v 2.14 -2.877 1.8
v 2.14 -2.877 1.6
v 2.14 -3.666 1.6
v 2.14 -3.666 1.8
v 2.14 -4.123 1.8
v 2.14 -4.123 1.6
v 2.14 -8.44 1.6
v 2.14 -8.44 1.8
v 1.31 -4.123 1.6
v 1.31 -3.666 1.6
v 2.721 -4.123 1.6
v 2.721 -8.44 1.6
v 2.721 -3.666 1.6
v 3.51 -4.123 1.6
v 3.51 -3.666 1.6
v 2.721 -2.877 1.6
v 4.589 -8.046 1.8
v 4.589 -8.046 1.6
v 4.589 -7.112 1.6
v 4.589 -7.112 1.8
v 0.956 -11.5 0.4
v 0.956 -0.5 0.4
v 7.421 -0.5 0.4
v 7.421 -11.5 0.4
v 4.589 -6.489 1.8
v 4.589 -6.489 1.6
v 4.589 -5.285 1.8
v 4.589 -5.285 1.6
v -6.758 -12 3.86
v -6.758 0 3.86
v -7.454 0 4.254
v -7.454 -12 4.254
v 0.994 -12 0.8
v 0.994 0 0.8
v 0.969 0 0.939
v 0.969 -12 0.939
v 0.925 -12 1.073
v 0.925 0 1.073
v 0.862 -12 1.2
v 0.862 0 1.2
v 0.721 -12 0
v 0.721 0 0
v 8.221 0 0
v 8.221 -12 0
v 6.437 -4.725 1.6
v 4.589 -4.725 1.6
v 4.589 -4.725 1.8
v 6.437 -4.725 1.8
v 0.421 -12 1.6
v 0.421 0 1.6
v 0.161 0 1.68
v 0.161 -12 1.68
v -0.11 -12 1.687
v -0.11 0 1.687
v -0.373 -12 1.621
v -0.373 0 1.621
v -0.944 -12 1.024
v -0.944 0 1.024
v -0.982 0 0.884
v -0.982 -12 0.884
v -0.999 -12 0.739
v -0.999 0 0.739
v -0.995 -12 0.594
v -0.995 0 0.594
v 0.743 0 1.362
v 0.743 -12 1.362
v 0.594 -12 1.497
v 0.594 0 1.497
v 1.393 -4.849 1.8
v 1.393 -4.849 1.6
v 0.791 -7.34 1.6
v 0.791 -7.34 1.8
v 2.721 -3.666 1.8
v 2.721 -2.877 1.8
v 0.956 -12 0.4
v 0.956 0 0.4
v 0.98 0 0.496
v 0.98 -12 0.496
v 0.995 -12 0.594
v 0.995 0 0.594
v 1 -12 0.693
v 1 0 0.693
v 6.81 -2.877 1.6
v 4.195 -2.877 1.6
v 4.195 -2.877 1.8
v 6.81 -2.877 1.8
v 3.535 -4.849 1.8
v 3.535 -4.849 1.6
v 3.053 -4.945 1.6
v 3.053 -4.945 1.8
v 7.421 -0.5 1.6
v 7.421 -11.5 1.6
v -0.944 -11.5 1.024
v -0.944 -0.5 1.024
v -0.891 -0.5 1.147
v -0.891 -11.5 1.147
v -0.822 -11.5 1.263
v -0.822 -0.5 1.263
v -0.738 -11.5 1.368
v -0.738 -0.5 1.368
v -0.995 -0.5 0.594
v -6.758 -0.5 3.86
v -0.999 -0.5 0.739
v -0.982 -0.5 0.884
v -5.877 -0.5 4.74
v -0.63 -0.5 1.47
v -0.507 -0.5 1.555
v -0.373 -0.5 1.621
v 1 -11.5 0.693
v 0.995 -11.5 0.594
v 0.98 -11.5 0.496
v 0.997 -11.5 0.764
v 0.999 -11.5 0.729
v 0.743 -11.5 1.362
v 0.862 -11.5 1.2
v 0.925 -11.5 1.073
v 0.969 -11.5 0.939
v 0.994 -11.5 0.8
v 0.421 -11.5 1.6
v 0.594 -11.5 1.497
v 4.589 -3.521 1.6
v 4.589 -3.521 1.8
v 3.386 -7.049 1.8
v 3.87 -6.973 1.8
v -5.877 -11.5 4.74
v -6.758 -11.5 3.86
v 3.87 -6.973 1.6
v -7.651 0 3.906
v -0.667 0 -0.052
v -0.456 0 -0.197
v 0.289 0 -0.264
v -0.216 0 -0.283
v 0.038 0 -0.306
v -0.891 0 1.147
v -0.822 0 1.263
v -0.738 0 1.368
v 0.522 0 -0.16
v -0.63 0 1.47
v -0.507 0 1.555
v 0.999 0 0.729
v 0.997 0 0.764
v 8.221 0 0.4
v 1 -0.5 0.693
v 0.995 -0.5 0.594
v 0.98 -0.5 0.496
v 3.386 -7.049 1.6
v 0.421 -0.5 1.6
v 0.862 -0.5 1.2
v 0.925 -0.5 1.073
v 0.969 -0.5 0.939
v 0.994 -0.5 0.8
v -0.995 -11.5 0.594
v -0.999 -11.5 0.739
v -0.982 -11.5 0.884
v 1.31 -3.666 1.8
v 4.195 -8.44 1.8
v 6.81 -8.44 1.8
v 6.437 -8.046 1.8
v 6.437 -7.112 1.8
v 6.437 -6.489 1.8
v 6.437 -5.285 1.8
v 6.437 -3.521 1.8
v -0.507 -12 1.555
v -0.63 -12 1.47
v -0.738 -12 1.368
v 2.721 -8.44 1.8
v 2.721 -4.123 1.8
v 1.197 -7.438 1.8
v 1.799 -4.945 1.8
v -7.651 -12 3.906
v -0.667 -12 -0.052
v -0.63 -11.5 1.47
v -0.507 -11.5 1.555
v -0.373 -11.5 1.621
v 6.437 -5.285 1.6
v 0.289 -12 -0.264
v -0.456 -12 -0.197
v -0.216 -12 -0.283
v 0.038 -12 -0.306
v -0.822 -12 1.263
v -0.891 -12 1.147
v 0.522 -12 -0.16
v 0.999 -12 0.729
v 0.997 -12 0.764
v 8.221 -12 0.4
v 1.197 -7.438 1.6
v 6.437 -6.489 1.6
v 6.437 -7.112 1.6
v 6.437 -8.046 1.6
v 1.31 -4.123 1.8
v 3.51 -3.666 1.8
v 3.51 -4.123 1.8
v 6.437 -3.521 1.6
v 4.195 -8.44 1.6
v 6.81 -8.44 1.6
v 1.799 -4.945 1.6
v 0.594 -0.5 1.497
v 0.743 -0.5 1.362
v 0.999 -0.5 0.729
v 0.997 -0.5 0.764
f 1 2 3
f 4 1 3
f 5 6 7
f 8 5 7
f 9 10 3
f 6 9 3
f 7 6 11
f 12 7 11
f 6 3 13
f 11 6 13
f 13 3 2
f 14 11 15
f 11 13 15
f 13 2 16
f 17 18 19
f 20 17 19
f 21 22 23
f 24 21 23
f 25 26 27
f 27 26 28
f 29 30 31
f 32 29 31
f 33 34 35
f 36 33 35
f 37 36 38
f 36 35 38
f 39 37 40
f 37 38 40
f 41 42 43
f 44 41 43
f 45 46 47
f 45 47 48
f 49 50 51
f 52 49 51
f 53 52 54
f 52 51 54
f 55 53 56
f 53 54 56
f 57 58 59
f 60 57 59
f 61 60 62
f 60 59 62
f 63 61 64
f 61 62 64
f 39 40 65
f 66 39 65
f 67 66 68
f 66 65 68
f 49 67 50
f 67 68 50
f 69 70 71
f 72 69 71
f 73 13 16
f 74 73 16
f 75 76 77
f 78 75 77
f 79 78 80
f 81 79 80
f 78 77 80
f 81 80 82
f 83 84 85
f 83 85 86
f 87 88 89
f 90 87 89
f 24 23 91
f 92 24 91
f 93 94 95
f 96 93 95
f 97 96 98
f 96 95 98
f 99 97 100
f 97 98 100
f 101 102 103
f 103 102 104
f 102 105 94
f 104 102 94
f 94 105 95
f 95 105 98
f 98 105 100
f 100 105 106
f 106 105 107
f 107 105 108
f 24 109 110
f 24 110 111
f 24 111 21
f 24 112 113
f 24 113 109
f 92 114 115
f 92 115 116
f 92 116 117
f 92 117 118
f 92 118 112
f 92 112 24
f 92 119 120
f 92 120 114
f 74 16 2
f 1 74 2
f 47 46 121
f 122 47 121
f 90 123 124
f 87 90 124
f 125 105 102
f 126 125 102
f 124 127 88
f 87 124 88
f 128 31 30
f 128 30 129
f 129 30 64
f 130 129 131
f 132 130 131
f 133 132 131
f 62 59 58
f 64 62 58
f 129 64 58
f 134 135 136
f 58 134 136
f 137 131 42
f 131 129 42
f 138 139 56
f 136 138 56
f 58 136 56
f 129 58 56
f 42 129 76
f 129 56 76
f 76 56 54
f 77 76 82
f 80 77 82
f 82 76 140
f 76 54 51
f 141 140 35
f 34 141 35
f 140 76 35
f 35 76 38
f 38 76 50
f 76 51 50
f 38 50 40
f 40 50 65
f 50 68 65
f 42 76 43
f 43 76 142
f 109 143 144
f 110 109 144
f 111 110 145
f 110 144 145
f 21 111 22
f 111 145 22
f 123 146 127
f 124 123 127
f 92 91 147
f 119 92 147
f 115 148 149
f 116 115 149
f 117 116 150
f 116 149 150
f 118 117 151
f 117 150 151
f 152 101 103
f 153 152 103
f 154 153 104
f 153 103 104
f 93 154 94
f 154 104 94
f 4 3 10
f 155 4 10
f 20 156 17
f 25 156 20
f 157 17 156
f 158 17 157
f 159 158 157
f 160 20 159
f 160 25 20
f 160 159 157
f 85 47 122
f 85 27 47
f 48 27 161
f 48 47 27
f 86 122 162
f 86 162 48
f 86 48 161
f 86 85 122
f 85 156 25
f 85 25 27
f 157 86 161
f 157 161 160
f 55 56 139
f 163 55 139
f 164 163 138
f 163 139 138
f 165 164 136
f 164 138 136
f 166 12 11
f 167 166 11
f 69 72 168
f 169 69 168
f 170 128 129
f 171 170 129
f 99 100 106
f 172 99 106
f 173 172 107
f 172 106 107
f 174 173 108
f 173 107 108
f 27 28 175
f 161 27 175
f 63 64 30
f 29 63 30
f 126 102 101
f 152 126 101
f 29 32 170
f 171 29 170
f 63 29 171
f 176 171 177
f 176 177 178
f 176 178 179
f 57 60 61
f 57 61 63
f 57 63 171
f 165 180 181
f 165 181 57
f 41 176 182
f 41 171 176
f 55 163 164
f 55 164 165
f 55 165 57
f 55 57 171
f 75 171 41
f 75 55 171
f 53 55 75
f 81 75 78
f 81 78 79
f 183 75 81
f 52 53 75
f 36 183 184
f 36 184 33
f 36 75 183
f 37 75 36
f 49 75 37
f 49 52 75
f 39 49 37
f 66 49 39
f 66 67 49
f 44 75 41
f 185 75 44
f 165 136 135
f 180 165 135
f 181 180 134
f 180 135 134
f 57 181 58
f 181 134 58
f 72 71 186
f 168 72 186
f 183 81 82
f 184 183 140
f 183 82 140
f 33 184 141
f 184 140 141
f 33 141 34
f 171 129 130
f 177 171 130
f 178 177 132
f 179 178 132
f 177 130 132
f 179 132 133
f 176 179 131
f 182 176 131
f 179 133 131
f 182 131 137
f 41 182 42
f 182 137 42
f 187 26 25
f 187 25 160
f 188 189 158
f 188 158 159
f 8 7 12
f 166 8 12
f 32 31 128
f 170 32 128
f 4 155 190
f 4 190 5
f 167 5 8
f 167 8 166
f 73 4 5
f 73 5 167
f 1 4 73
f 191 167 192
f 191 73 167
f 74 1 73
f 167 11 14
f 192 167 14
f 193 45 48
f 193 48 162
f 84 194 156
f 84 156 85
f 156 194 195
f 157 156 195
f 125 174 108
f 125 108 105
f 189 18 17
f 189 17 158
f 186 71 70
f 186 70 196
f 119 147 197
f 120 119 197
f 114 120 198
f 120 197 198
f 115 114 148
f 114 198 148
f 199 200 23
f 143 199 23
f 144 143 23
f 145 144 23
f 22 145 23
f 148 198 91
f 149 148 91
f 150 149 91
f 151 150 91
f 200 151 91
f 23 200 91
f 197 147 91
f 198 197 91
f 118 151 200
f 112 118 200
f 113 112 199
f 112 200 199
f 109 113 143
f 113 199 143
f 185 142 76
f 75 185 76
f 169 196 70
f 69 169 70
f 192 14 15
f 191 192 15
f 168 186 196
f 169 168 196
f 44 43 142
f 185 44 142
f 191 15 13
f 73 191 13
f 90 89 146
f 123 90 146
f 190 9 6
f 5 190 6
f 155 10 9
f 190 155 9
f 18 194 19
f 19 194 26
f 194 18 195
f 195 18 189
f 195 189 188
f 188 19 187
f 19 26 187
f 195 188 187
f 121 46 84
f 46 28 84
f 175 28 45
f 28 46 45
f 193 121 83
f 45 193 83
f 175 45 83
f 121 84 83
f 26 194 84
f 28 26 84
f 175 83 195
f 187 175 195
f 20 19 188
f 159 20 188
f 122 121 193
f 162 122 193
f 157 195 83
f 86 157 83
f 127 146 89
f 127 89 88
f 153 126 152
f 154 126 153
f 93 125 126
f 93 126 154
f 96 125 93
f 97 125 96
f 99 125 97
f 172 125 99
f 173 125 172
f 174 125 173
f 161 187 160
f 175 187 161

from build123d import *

# Parameters (mm, degrees)
F1_DEPTH = 12
F2_DEPTH = 11.5
F3_DEPTH = 0.5
F6_DEPTH = 0.2
F5_W     = 2.6153679937
F5_H     = 5.5628458504
F5_W_2   = 1.8473630771
F5_H_2   = 0.9340597317
F5_H_3   = 1.2038992718
F5_H_4   = 1.2038995046


with BuildPart() as f1:
    # F0 (on Front) → F1 (new body)
    with BuildSketch(Plane.XZ):
        with BuildLine():
            ThreePointArc((-0.6667518235, -0.0523417812), (0.0376902395, -0.3063514346), (0.7209971417, 0))
            ThreePointArc((0.7209971417, 0), (0.8620847172, 0.1861738498), (0.9561314277, 0.4))
            ThreePointArc((0.9561314277, 0.4), (0.9889720491, 0.5448357533), (1, 0.6929380359))
            ThreePointArc((1, 0.6929380359), (0.9985620537, 0.7465461035), (0.9942523502, 0.8))
            ThreePointArc((0.9942523502, 0.8), (0.9493862752, 1.0070490043), (0.8619096035, 1.2))
            ThreePointArc((0.8619096035, 1.2), (0.6719095395, 1.4335712588), (0.4209971417, 1.6))
            ThreePointArc((0.4209971417, 1.6), (0.0258903466, 1.6926028247), (-0.3734801914, 1.6205761909))
            ThreePointArc((-0.3734801914, 1.6205761909), (-0.5700605115, 1.514540746), (-0.7382020302, 1.3675177292))
            ThreePointArc((-0.7382020302, 1.3675177292), (-0.858231763, 1.206200387), (-0.9435628237, 1.0241316314))
            ThreePointArc((-0.9435628237, 1.0241316314), (-0.9929283296, 0.8116533775), (-0.995046372, 0.5935261773))
            ThreePointArc((-0.995046372, 0.5935261773), (-0.8914480723, 0.2398151669), (-0.6667518235, -0.0523417812))
        make_face()
        with BuildLine():
            ThreePointArc((0.9561314277, 0.4), (0.8620847172, 0.1861738498), (0.7209971417, 0))
            Line((0.7209971417, 0), (8.2209971417, 0))
            Line((8.2209971417, 0), (8.2209971417, 0.4))
            Line((8.2209971417, 0.4), (7.4209971417, 0.4))
            Line((7.4209971417, 0.4), (0.9561314277, 0.4))
        make_face()
        with BuildLine():
            Line((-7.6510265364, 3.9064238207), (-0.6667518235, -0.0523417812))
            ThreePointArc((-0.6667518235, -0.0523417812), (-0.8914480723, 0.2398151669), (-0.995046372, 0.5935261773))
            Line((-0.995046372, 0.5935261773), (-6.7578088428, 3.8599248771))
            Line((-6.7578088428, 3.8599248771), (-7.4537834202, 4.2544111095))
            Line((-7.4537834202, 4.2544111095), (-7.6510265364, 3.9064238207))
        make_face()
    extrude(amount=F1_DEPTH)


with BuildPart() as f2:
    # F0 (on Front) → F2 (new body)
    with BuildSketch(Plane.XZ):
        with BuildLine():
            ThreePointArc((1, 0.6929380359), (0.9889720491, 0.5448357533), (0.9561314277, 0.4))
            Line((0.9561314277, 0.4), (7.4209971417, 0.4))
            Line((7.4209971417, 0.4), (7.4209971417, 0.8))
            Line((7.4209971417, 0.8), (0.9942523502, 0.8))
            ThreePointArc((0.9942523502, 0.8), (0.9985620537, 0.7465461035), (1, 0.6929380359))
        make_face()
        with BuildLine():
            ThreePointArc((0.8619096035, 1.2), (0.9493862752, 1.0070490043), (0.9942523502, 0.8))
            Line((0.9942523502, 0.8), (7.4209971417, 0.8))
            Line((7.4209971417, 0.8), (7.4209971417, 1.2))
            Line((7.4209971417, 1.2), (0.8619096035, 1.2))
        make_face()
        with BuildLine():
            ThreePointArc((0.4209971417, 1.6), (0.6719095395, 1.4335712588), (0.8619096035, 1.2))
            Line((0.8619096035, 1.2), (7.4209971417, 1.2))
            Line((7.4209971417, 1.2), (7.4209971417, 1.6))
            Line((7.4209971417, 1.6), (0.4209971417, 1.6))
        make_face()
    extrude(amount=F2_DEPTH)


with BuildPart() as f2b:
    # F0 (on Front) → F2, piece 2 (new body)
    with BuildSketch(Plane.XZ):
        with BuildLine():
            Line((-6.7578088428, 3.8599248771), (-0.995046372, 0.5935261773))
            ThreePointArc((-0.995046372, 0.5935261773), (-0.9929283296, 0.8116533775), (-0.9435628237, 1.0241316314))
            Line((-0.9435628237, 1.0241316314), (-6.4643549221, 4.1533787978))
            Line((-6.4643549221, 4.1533787978), (-6.7578088428, 3.8599248771))
        make_face()
        with BuildLine():
            Line((-6.4643549221, 4.1533787978), (-0.9435628237, 1.0241316314))
            ThreePointArc((-0.9435628237, 1.0241316314), (-0.858231763, 1.206200387), (-0.7382020302, 1.3675177292))
            Line((-0.7382020302, 1.3675177292), (-6.1709010014, 4.4468327185))
            Line((-6.1709010014, 4.4468327185), (-6.4643549221, 4.1533787978))
        make_face()
        with BuildLine():
            Line((-6.1709010014, 4.4468327185), (-0.7382020302, 1.3675177292))
            ThreePointArc((-0.7382020302, 1.3675177292), (-0.5700605115, 1.514540746), (-0.3734801914, 1.6205761909))
            Line((-0.3734801914, 1.6205761909), (-5.8774470807, 4.7402866392))
            Line((-5.8774470807, 4.7402866392), (-6.1709010014, 4.4468327185))
        make_face()
    extrude(amount=F2_DEPTH)


with BuildPart() as f3_tool:
    # F0 (on Front) → F3 (new body)
    with BuildSketch(Plane.XZ):
        with BuildLine():
            Line((-6.1709010014, 4.4468327185), (-0.7382020302, 1.3675177292))
            ThreePointArc((-0.7382020302, 1.3675177292), (-0.5700605115, 1.514540746), (-0.3734801914, 1.6205761909))
            Line((-0.3734801914, 1.6205761909), (-5.8774470807, 4.7402866392))
            Line((-5.8774470807, 4.7402866392), (-6.1709010014, 4.4468327185))
        make_face()
        with BuildLine():
            Line((-6.4643549221, 4.1533787978), (-0.9435628237, 1.0241316314))
            ThreePointArc((-0.9435628237, 1.0241316314), (-0.858231763, 1.206200387), (-0.7382020302, 1.3675177292))
            Line((-0.7382020302, 1.3675177292), (-6.1709010014, 4.4468327185))
            Line((-6.1709010014, 4.4468327185), (-6.4643549221, 4.1533787978))
        make_face()
        with BuildLine():
            Line((-6.7578088428, 3.8599248771), (-0.995046372, 0.5935261773))
            ThreePointArc((-0.995046372, 0.5935261773), (-0.9929283296, 0.8116533775), (-0.9435628237, 1.0241316314))
            Line((-0.9435628237, 1.0241316314), (-6.4643549221, 4.1533787978))
            Line((-6.4643549221, 4.1533787978), (-6.7578088428, 3.8599248771))
        make_face()
        with BuildLine():
            ThreePointArc((0.4209971417, 1.6), (0.6719095395, 1.4335712588), (0.8619096035, 1.2))
            Line((0.8619096035, 1.2), (7.4209971417, 1.2))
            Line((7.4209971417, 1.2), (7.4209971417, 1.6))
            Line((7.4209971417, 1.6), (0.4209971417, 1.6))
        make_face()
        with BuildLine():
            ThreePointArc((0.8619096035, 1.2), (0.9493862752, 1.0070490043), (0.9942523502, 0.8))
            Line((0.9942523502, 0.8), (7.4209971417, 0.8))
            Line((7.4209971417, 0.8), (7.4209971417, 1.2))
            Line((7.4209971417, 1.2), (0.8619096035, 1.2))
        make_face()
        with BuildLine():
            ThreePointArc((1, 0.6929380359), (0.9889720491, 0.5448357533), (0.9561314277, 0.4))
            Line((0.9561314277, 0.4), (7.4209971417, 0.4))
            Line((7.4209971417, 0.4), (7.4209971417, 0.8))
            Line((7.4209971417, 0.8), (0.9942523502, 0.8))
            ThreePointArc((0.9942523502, 0.8), (0.9985620537, 0.7465461035), (1, 0.6929380359))
        make_face()
    extrude(amount=F3_DEPTH)


with BuildPart() as f2_1:
    add(f2.part)

    # F3: cut by f3_tool
    add(f3_tool.part, mode=Mode.SUBTRACT)


with BuildPart() as f2b_1:
    add(f2b.part)

    # F3: cut by f3_tool
    add(f3_tool.part, mode=Mode.SUBTRACT)


with BuildPart() as f6:
    # F5 (on offset) → F6 (new body)
    with BuildSketch(Plane.XY.offset(1.6)):
        Polygon((1.7991621546, -4.945203089), (1.3928536791, -4.8492602073), (0.7909039268, -7.340086624), (1.1966990358, -7.438153781), align=None)
    extrude(amount=F6_DEPTH)


with BuildPart() as f6b:
    # F5 (on offset) → F6, piece 2 (new body)
    with BuildSketch(Plane.XY.offset(1.6)):
        Polygon((2.7212945279, -2.8773562517), (2.140101511, -2.8773562517), (2.140101511, -3.6661177874), (1.3098260388, -3.6661177874), (1.3098260388, -4.1227694601), (2.140101511, -4.1227694601), (2.140101511, -8.4402021021), (2.7212945279, -8.4402021021), (2.7212945279, -4.1227694601), (3.5100560635, -4.1227694601), (3.5100560635, -3.6661177874), (2.7212945279, -3.6661177874), align=None)
    extrude(amount=F6_DEPTH)


with BuildPart() as f6c:
    # F5 (on offset) → F6, piece 3 (new body)
    with BuildSketch(Plane.XY.offset(1.6)):
        Polygon((3.5353264474, -4.8492602073), (3.0534043908, -4.945203089), (3.3855147194, -7.049490232), (3.8704985958, -6.9729473728), align=None)
    extrude(amount=F6_DEPTH)


with BuildPart() as f6d:
    # F5 (on offset) → F6, piece 4 (new body)
    with BuildSketch(Plane.XY.offset(1.6)):
        with Locations((5.5027175695, -5.6587791769)):
            Rectangle(F5_W, F5_H)
        with Locations((5.5130957626, -7.5787906535)):
            Rectangle(F5_W_2, F5_H_2, mode=Mode.SUBTRACT)
        with Locations((5.5130957626, -5.887104664)):
            Rectangle(F5_W_2, F5_H_3, mode=Mode.SUBTRACT)
        with Locations((5.5130957626, -4.1227693437)):
            Rectangle(F5_W_2, F5_H_4, mode=Mode.SUBTRACT)
    extrude(amount=F6_DEPTH)


solid = Compound([f1.part, f2_1.part, f2b_1.part, f6.part, f6b.part, f6c.part, f6d.part])
